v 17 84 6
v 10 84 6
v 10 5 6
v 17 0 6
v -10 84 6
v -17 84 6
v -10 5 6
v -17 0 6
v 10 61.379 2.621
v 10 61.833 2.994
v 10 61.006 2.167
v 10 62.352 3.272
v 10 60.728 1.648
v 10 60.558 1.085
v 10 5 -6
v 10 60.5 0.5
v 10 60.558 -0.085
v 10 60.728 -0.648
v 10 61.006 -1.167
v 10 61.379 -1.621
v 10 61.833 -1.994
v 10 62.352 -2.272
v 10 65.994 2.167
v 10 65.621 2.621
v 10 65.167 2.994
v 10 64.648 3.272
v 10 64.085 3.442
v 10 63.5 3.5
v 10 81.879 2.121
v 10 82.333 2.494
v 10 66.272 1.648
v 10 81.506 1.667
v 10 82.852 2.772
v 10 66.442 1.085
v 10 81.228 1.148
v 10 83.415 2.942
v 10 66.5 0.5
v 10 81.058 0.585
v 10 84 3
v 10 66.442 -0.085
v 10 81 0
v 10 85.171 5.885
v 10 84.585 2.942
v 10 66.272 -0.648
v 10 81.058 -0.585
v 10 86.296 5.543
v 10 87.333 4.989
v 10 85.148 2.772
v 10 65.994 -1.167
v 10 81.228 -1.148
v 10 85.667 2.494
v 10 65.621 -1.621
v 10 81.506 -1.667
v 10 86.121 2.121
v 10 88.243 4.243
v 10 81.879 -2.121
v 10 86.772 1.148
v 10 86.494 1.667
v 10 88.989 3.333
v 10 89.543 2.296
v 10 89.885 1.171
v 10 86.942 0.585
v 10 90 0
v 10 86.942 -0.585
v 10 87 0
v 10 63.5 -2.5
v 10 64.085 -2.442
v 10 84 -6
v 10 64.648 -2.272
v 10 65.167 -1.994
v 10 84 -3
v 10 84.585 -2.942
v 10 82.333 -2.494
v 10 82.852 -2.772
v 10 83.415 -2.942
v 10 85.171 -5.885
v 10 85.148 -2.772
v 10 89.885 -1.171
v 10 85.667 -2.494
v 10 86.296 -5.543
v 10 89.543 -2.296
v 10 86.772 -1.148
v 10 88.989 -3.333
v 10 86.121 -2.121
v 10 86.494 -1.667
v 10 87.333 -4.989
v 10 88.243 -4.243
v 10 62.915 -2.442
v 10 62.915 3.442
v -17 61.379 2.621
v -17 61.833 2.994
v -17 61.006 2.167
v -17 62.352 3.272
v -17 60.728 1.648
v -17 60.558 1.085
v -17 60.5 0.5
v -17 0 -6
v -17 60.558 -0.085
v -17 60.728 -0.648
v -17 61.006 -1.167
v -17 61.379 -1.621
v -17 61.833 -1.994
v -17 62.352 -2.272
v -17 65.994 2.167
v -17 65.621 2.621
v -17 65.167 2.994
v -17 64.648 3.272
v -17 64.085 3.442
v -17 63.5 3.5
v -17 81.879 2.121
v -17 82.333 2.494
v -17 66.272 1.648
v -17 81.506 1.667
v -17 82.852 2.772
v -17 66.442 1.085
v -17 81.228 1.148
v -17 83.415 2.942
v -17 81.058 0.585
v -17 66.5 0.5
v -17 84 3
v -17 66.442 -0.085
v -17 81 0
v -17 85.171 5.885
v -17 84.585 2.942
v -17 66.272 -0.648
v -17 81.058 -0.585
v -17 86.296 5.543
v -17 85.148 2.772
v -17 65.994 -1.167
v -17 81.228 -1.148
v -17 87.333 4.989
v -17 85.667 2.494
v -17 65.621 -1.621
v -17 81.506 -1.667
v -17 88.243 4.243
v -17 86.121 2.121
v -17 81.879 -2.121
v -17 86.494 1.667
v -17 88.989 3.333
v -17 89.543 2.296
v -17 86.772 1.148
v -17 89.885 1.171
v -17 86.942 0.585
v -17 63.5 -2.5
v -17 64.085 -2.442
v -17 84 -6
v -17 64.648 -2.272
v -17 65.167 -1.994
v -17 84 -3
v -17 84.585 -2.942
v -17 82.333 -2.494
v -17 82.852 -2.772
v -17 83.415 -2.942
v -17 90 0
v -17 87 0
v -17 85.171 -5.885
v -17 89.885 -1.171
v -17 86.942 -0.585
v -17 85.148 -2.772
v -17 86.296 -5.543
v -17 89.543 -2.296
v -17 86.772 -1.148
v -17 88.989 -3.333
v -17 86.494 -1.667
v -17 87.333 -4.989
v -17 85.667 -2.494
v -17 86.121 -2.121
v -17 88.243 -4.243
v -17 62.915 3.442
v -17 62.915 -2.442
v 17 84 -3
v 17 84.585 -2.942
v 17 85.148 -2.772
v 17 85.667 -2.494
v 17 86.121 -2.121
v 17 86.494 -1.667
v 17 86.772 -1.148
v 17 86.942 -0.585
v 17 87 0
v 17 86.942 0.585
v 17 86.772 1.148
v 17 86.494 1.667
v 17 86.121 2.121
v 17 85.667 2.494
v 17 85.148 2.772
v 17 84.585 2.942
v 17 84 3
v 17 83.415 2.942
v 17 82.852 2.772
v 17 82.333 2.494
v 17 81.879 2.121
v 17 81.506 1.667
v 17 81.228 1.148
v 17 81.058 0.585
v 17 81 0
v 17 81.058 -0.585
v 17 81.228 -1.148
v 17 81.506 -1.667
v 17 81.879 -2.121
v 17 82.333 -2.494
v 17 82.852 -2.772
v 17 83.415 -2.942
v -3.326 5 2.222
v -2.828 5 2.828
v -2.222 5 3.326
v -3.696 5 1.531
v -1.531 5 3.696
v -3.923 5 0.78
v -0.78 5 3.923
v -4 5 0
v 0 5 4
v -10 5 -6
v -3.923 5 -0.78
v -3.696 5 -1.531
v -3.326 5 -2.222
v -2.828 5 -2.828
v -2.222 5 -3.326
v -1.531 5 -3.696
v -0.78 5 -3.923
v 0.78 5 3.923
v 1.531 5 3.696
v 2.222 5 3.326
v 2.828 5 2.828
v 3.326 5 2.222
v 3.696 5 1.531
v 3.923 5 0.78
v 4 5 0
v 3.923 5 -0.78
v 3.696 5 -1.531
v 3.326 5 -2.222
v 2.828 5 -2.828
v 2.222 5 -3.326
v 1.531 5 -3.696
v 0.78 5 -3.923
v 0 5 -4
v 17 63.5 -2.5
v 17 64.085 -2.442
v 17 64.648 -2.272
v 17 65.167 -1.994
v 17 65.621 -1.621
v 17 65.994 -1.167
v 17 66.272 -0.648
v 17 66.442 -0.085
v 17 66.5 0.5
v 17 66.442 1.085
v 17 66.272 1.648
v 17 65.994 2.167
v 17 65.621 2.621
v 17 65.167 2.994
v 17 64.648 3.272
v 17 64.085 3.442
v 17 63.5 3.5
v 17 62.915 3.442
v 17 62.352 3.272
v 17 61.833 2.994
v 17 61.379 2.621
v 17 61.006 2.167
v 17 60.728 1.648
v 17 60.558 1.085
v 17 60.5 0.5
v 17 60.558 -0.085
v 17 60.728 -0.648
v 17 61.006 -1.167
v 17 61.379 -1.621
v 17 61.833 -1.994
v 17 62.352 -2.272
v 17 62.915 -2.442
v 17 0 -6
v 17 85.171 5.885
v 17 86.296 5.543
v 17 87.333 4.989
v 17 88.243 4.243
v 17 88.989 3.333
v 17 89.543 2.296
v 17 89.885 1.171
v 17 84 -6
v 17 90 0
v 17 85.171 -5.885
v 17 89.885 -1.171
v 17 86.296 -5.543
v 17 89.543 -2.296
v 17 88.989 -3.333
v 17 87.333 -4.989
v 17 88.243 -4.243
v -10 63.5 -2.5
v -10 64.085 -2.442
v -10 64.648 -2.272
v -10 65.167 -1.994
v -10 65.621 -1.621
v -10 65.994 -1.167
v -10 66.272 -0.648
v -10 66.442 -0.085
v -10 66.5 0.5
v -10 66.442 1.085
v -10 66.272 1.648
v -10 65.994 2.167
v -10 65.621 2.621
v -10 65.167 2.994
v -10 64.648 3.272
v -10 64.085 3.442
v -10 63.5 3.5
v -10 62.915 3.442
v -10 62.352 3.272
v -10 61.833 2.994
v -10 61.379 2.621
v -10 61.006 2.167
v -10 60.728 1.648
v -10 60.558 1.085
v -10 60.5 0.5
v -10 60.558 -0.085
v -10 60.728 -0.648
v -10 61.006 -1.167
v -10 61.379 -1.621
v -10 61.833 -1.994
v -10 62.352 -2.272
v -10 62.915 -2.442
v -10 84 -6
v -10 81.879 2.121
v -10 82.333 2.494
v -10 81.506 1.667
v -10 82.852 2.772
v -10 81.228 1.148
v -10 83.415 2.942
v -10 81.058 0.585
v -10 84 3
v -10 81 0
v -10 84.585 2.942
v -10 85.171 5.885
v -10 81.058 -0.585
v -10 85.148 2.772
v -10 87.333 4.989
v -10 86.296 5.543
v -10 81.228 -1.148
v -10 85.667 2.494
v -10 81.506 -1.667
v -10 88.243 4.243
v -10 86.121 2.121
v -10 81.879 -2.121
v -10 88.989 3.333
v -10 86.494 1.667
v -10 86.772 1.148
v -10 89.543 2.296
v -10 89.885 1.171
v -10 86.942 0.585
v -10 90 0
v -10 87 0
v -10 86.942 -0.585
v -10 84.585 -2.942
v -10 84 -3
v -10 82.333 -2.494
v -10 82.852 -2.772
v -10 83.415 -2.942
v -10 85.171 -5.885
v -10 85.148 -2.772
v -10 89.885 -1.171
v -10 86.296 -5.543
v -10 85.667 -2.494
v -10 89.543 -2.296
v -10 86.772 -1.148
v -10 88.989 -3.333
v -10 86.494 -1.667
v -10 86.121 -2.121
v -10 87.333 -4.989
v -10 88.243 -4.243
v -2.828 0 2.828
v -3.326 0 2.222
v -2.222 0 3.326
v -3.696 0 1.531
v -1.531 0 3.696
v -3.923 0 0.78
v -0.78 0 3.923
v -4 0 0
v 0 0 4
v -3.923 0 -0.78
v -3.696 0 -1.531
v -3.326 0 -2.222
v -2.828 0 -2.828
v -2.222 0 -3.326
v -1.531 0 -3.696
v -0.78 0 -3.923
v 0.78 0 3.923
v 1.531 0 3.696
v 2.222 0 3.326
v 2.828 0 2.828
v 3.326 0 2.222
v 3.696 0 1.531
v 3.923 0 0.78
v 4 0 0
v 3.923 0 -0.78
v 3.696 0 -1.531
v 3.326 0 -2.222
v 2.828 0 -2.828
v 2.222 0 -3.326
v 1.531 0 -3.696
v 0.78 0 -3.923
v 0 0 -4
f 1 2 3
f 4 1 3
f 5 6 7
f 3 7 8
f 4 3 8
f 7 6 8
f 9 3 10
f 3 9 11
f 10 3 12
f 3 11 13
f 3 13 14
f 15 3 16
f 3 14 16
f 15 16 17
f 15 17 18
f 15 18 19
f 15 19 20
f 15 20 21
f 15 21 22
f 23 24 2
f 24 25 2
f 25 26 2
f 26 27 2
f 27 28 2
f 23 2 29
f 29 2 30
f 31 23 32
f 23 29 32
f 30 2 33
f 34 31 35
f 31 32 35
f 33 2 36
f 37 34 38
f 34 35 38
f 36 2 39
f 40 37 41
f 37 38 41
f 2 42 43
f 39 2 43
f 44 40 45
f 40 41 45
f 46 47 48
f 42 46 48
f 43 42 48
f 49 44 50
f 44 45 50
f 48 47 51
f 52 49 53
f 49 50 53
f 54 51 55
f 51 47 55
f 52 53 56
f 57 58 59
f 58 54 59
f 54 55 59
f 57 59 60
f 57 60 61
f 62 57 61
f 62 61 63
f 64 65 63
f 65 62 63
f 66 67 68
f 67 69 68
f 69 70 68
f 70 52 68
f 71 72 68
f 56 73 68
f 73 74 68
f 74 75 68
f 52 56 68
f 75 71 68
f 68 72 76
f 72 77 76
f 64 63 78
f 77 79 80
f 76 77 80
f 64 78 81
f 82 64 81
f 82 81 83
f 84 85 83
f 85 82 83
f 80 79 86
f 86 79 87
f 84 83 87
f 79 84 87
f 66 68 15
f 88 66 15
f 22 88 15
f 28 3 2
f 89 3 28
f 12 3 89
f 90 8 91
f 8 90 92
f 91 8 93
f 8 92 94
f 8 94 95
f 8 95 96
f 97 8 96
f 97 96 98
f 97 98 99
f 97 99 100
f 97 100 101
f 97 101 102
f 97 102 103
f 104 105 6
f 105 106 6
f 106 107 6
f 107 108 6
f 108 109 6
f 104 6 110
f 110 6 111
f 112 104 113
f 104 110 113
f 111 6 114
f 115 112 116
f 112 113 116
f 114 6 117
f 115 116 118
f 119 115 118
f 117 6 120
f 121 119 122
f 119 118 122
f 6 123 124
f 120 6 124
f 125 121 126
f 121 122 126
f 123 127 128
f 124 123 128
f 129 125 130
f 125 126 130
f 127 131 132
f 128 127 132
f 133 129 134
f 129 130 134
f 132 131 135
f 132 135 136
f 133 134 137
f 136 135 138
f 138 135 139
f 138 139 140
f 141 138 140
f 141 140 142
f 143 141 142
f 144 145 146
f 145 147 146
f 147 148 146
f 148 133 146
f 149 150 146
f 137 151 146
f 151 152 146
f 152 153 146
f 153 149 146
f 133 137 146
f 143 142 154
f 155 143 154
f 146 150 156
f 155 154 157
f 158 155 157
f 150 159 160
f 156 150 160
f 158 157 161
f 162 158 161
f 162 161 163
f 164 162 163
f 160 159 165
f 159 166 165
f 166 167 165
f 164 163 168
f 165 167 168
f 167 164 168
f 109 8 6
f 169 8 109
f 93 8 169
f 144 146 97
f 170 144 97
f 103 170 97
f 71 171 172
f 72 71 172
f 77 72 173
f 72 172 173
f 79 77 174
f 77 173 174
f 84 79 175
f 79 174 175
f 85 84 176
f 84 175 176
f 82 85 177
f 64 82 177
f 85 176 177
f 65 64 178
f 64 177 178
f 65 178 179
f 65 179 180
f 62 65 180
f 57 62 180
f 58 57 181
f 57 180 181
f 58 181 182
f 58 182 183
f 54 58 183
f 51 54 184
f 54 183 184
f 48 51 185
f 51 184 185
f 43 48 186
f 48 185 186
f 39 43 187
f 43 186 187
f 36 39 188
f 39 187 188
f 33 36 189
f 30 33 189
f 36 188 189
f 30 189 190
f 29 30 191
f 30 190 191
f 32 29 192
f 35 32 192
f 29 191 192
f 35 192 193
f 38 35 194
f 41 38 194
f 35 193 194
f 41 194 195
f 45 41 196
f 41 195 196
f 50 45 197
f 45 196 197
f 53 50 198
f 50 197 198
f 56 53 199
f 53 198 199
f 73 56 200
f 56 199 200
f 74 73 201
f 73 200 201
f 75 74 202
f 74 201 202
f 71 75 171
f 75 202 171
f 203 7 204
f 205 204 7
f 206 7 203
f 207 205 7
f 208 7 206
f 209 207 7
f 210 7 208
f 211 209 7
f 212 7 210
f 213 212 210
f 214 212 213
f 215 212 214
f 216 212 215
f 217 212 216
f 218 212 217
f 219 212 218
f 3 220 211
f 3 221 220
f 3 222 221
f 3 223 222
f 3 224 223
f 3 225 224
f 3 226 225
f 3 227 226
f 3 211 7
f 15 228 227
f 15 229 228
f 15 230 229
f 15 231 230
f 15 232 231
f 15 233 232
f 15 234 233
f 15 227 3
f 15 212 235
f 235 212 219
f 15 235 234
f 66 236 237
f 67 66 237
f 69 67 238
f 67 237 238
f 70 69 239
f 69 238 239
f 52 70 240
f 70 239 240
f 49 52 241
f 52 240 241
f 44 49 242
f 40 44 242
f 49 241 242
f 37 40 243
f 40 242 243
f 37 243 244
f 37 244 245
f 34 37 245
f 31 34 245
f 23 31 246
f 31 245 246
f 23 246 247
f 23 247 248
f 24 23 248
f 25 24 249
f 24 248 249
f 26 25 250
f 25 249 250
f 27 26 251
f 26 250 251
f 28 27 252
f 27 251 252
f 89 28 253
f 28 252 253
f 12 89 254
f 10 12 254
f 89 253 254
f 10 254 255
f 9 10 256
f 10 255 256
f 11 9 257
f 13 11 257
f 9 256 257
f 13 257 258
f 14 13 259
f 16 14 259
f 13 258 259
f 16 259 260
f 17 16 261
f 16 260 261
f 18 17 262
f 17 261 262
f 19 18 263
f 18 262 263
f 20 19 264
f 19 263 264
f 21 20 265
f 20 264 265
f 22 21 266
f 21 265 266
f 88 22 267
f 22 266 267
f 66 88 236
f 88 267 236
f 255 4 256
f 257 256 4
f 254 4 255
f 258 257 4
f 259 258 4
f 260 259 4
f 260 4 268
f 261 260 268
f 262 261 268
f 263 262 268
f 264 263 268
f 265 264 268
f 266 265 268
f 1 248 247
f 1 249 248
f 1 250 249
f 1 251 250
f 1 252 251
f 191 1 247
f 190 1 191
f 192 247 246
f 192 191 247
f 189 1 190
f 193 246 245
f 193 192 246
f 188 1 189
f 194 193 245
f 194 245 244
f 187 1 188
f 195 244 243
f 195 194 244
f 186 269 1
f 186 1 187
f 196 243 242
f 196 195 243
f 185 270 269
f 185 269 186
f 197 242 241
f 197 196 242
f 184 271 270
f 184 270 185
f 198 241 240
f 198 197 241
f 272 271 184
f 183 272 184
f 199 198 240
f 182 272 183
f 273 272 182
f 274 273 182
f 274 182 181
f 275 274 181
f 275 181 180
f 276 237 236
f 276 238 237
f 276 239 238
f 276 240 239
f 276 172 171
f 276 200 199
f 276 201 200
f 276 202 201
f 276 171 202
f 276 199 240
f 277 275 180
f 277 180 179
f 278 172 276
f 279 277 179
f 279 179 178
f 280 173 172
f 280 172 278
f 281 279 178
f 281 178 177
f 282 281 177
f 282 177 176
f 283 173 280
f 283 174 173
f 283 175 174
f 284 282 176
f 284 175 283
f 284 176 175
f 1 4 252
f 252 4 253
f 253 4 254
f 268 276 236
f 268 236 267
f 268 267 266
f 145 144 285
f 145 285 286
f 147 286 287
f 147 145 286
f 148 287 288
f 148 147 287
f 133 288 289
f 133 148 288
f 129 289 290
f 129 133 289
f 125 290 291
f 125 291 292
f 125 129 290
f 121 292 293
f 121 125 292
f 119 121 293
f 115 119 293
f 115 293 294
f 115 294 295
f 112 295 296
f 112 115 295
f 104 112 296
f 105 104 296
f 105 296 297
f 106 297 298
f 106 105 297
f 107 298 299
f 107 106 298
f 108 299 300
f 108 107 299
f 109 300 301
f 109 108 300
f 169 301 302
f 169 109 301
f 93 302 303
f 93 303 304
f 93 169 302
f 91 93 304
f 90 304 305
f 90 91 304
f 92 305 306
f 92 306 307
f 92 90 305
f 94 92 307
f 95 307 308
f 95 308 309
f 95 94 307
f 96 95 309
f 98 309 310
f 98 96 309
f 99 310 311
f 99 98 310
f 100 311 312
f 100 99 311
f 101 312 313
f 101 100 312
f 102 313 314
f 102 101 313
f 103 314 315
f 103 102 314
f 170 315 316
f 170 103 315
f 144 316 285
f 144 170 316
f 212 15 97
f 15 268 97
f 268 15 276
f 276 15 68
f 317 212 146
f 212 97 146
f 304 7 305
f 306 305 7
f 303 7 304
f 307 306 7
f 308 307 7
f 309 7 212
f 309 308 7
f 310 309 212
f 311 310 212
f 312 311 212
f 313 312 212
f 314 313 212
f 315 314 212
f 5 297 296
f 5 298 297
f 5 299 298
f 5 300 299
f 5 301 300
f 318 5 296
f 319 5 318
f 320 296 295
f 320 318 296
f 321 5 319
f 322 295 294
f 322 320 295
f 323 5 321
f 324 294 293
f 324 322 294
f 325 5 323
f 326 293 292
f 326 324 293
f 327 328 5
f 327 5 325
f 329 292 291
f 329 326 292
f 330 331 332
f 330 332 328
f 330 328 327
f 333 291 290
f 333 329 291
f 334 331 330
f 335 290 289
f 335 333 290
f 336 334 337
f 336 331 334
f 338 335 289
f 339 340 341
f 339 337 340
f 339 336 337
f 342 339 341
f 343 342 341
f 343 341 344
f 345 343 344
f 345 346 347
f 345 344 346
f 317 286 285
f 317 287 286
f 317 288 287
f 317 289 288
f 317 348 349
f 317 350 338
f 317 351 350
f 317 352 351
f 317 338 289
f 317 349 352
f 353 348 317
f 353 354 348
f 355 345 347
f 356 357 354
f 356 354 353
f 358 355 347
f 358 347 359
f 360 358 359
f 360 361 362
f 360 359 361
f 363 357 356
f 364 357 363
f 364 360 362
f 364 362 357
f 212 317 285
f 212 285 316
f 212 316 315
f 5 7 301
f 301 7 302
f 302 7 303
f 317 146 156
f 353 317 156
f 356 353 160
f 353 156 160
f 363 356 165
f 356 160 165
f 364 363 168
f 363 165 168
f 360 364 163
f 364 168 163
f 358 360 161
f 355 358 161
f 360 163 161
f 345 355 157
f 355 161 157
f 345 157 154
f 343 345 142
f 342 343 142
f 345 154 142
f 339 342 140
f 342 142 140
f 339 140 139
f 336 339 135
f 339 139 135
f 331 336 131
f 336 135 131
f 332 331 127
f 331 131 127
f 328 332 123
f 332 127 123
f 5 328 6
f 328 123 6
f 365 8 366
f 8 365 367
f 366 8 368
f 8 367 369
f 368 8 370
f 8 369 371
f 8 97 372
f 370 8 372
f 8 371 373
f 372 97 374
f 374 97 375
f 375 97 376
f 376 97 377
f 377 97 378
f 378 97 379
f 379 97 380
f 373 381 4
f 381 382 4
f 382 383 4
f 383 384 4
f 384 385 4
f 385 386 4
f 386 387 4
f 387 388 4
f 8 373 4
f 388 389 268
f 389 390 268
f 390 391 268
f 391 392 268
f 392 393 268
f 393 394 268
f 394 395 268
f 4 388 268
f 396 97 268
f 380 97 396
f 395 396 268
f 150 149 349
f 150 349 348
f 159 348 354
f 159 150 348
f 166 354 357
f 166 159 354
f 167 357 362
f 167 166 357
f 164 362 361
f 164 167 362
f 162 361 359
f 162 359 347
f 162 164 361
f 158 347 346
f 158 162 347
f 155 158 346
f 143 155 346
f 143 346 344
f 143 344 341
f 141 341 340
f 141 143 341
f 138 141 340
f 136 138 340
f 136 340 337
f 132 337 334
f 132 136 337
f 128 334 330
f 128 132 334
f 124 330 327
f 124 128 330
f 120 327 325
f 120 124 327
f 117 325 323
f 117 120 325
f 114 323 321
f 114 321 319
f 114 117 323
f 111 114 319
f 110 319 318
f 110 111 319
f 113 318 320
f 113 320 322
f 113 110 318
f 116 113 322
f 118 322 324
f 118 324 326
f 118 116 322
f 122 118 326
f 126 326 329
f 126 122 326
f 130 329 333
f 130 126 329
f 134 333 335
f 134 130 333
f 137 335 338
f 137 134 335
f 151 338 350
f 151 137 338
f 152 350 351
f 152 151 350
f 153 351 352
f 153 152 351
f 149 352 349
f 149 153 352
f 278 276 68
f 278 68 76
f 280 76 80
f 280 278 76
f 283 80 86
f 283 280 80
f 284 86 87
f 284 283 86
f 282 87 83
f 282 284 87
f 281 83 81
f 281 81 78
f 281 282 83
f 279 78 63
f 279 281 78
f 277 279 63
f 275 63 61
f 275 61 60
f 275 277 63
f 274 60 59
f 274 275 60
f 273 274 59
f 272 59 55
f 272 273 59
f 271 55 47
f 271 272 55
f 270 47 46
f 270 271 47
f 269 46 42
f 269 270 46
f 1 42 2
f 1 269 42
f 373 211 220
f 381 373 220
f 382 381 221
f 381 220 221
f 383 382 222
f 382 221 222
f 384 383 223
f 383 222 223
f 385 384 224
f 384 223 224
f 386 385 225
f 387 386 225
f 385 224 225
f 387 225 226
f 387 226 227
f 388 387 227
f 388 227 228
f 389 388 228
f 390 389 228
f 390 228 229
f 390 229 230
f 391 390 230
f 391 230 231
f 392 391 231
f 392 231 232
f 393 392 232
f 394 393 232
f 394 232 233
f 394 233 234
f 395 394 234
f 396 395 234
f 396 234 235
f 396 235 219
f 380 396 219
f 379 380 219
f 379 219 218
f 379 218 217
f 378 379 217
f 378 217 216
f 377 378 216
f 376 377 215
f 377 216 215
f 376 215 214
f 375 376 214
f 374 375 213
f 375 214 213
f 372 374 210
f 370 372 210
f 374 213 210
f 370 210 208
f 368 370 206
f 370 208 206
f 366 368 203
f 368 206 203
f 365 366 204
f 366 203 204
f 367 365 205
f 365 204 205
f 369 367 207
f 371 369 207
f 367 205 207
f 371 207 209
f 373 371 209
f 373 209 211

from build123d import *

# Parameters (mm, degrees)
SKETCH1_W           = 34
SKETCH1_H           = 12
BOSS_EXTRUDE1_DEPTH = 5
SKETCH5_R           = 3
BOSS_EXTRUDE3_DEPTH = 7
SKETCH6_R           = 1.5
CUT_EXTRUDE1_DEPTH  = 3
SKETCH8_R           = 4
CUT_EXTRUDE4_DEPTH  = 87.890735985


with BuildPart() as part:
    # Sketch1 → Boss-Extrude1 (new body)
    with BuildSketch(Plane(origin=(0, 0, 0), x_dir=(1, 0, 0), z_dir=(0, 1, 0))):
        Rectangle(SKETCH1_W, SKETCH1_H)
    extrude(amount=BOSS_EXTRUDE1_DEPTH)

    # Sketch5 → Boss-Extrude3 (add)
    with BuildSketch(Plane(origin=(17, 0, 0), x_dir=(0, 0, -1), z_dir=(1, 0, 0))):
        with BuildLine():
            Line((-6, 5), (6, 5))
            Line((6, 5), (6, 84))
            ThreePointArc((6, 84), (0, 90), (-6, 84))
            Line((-6, 84), (-6, 5))
        make_face()
        with Locations((0, 84)):
            Circle(SKETCH5_R, mode=Mode.SUBTRACT)
        with Locations((-0.5, 63.5)):
            Circle(SKETCH5_R, mode=Mode.SUBTRACT)
    boss_extrude3 = extrude(amount=-BOSS_EXTRUDE3_DEPTH)

    # Sketch6 → Cut-Extrude1 (cut)
    with BuildSketch(Plane(origin=(0, 5, 0), x_dir=(1, 0, 0), z_dir=(0, 1, 0))):
        with Locations(Location((0, 0, 0), (0, 0, 270))):
            Circle(SKETCH6_R)
    extrude(amount=-CUT_EXTRUDE1_DEPTH, mode=Mode.SUBTRACT)

    # Sketch8 → Cut-Extrude4 (cut, through all)
    with BuildSketch(Plane(origin=(0, 5, 0), x_dir=(1, 0, 0), z_dir=(0, 1, 0))):
        with Locations(Location((0, 0, 0), (0, 0, 270))):
            Circle(SKETCH8_R)
    extrude(amount=-CUT_EXTRUDE4_DEPTH, mode=Mode.SUBTRACT)

    # Mirror1: Boss-Extrude3 across plane
    add(boss_extrude3.mirror(Plane(origin=(0, 0, 0), x_dir=(0, 0, 1), z_dir=(1, 0, 0))))


solid = part.part
